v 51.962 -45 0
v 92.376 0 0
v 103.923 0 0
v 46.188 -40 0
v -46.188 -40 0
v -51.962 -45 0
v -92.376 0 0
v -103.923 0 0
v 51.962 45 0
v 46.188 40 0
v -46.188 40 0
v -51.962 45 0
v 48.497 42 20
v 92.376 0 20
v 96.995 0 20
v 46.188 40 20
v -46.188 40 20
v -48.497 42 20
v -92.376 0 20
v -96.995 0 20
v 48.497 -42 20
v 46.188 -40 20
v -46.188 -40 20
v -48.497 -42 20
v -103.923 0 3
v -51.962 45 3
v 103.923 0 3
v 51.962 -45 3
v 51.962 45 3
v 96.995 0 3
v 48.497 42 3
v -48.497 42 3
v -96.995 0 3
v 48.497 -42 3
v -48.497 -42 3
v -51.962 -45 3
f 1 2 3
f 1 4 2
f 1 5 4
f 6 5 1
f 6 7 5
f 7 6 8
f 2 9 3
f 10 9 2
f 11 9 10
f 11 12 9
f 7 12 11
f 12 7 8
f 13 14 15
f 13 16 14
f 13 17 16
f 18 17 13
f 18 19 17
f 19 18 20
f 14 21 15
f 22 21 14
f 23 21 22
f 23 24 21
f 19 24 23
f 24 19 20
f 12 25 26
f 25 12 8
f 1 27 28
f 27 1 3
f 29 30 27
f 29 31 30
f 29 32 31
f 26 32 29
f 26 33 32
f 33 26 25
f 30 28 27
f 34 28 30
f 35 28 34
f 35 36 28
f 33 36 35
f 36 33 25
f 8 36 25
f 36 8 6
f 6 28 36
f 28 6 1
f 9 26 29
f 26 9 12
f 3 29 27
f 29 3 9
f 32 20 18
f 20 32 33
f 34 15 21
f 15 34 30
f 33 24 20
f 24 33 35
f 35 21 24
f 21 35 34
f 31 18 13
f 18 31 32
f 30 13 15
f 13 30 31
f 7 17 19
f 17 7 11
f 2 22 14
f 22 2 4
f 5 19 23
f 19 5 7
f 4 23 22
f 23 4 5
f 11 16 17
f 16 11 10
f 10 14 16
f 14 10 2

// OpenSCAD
// Float for seven 15 mL conical tubes, printed upside down.
// It rests on the XY plane at z = 0 and builds upward (+Z).
// When flipped for use, the skirt and sleeves trap air under the plate.

$fn = 64;

// ---- Plate (regular hexagon, 90 mm across the flats, 3 mm thick) ----
plate_af  = 90;   // across the flats of the plate hexagon
plate_t   = 3;    // plate thickness (z = 0 to 3)
plate_ap  = plate_af * 2 / sqrt(3);  // across the corners = 103.923

// ---- Seven 17.5 mm through-holes: one at centre, six on a 54 mm circle ----
hole_d    = 17.5; // hole diameter
hole_r    = hole_d / 2;
ring_d    = 54;   // diameter of the circle carrying the six outer holes
ring_r    = ring_d / 2;

// ---- Sleeves: 2 mm wall, 21.5 mm outside, rising from the plate to z = 20 ----
sleeve_od = 21.5; // sleeve outside diameter
sleeve_id = sleeve_od - 2 * 2; // sleeve inside diameter (17.5)
sleeve_h  = 20;   // sleeve top height (z = 0 to 20)

// ---- Hexagonal skirt: 2 mm wall, 84 mm across the flats outside ----
skirt_af  = 84;   // across the flats of the skirt (outside)
skirt_ap  = skirt_af * 2 / sqrt(3); // across the corners of the skirt
skirt_h   = 20;   // skirt top height (z = 0 to 20)

// ---- Helper: regular hexagon polygon (flat sides parallel to X axis) ----
module hexagon(af) {
    ap = af * 2 / sqrt(3);
    polygon(points=[
        [ ap,  0],
        [ ap/2,  af/2],
        [-ap/2,  af/2],
        [-ap,   0],
        [-ap/2, -af/2],
        [ ap/2, -af/2]
    ]);
}

// ---- Hole centre positions (one at origin, six on the 54 mm circle) ----
hole_pos = [
    [0, 0],
    [ring_r, 0],
    [ring_r * cos(60), ring_r * sin(60)],
    [ring_r * cos(120), ring_r * sin(120)],
    [ring_r * cos(180), ring_r * sin(180)],
    [ring_r * cos(240), ring_r * sin(240)],
    [ring_r * cos(300), ring_r * sin(300)]
];

// ---- Build the float ----
difference() {
    // Union of all solid material
    union() {
        // Flat hexagonal plate (z = 0 to 3)
        linear_extrude(plate_t) hexagon(plate_af);

        // Seven sleeves (z = 0 to 20)
        for (p = hole_pos) {
            translate([p[0], p[1], 0])
                cylinder(h = sleeve_h, d = sleeve_od, $fn = $fn);
        }

        // Hexagonal skirt (z = 0 to 20)
        linear_extrude(skirt_h) hexagon(skirt_af);
    }

    // Cut the seven 17.5 mm through-holes (extend 1 mm past each face)
    for (p = hole_pos) {
        translate([p[0], p[1], -1])
            cylinder(h = sleeve_h + 2, d = hole_d, $fn = $fn);
    }

    // Cut the skirt wall: remove the interior of the skirt hexagon (z = 0 to 20)
    // The 1 mm overhangs ensure no coplanar faces with the plate or sleeve tops.
    linear_extrude(skirt_h + 1, convex = true)
        translate([0, 0, -1])
        hexagon(skirt_af - 2 * 2); // 80 mm across the flats (inside of the 2 mm wall)
}
